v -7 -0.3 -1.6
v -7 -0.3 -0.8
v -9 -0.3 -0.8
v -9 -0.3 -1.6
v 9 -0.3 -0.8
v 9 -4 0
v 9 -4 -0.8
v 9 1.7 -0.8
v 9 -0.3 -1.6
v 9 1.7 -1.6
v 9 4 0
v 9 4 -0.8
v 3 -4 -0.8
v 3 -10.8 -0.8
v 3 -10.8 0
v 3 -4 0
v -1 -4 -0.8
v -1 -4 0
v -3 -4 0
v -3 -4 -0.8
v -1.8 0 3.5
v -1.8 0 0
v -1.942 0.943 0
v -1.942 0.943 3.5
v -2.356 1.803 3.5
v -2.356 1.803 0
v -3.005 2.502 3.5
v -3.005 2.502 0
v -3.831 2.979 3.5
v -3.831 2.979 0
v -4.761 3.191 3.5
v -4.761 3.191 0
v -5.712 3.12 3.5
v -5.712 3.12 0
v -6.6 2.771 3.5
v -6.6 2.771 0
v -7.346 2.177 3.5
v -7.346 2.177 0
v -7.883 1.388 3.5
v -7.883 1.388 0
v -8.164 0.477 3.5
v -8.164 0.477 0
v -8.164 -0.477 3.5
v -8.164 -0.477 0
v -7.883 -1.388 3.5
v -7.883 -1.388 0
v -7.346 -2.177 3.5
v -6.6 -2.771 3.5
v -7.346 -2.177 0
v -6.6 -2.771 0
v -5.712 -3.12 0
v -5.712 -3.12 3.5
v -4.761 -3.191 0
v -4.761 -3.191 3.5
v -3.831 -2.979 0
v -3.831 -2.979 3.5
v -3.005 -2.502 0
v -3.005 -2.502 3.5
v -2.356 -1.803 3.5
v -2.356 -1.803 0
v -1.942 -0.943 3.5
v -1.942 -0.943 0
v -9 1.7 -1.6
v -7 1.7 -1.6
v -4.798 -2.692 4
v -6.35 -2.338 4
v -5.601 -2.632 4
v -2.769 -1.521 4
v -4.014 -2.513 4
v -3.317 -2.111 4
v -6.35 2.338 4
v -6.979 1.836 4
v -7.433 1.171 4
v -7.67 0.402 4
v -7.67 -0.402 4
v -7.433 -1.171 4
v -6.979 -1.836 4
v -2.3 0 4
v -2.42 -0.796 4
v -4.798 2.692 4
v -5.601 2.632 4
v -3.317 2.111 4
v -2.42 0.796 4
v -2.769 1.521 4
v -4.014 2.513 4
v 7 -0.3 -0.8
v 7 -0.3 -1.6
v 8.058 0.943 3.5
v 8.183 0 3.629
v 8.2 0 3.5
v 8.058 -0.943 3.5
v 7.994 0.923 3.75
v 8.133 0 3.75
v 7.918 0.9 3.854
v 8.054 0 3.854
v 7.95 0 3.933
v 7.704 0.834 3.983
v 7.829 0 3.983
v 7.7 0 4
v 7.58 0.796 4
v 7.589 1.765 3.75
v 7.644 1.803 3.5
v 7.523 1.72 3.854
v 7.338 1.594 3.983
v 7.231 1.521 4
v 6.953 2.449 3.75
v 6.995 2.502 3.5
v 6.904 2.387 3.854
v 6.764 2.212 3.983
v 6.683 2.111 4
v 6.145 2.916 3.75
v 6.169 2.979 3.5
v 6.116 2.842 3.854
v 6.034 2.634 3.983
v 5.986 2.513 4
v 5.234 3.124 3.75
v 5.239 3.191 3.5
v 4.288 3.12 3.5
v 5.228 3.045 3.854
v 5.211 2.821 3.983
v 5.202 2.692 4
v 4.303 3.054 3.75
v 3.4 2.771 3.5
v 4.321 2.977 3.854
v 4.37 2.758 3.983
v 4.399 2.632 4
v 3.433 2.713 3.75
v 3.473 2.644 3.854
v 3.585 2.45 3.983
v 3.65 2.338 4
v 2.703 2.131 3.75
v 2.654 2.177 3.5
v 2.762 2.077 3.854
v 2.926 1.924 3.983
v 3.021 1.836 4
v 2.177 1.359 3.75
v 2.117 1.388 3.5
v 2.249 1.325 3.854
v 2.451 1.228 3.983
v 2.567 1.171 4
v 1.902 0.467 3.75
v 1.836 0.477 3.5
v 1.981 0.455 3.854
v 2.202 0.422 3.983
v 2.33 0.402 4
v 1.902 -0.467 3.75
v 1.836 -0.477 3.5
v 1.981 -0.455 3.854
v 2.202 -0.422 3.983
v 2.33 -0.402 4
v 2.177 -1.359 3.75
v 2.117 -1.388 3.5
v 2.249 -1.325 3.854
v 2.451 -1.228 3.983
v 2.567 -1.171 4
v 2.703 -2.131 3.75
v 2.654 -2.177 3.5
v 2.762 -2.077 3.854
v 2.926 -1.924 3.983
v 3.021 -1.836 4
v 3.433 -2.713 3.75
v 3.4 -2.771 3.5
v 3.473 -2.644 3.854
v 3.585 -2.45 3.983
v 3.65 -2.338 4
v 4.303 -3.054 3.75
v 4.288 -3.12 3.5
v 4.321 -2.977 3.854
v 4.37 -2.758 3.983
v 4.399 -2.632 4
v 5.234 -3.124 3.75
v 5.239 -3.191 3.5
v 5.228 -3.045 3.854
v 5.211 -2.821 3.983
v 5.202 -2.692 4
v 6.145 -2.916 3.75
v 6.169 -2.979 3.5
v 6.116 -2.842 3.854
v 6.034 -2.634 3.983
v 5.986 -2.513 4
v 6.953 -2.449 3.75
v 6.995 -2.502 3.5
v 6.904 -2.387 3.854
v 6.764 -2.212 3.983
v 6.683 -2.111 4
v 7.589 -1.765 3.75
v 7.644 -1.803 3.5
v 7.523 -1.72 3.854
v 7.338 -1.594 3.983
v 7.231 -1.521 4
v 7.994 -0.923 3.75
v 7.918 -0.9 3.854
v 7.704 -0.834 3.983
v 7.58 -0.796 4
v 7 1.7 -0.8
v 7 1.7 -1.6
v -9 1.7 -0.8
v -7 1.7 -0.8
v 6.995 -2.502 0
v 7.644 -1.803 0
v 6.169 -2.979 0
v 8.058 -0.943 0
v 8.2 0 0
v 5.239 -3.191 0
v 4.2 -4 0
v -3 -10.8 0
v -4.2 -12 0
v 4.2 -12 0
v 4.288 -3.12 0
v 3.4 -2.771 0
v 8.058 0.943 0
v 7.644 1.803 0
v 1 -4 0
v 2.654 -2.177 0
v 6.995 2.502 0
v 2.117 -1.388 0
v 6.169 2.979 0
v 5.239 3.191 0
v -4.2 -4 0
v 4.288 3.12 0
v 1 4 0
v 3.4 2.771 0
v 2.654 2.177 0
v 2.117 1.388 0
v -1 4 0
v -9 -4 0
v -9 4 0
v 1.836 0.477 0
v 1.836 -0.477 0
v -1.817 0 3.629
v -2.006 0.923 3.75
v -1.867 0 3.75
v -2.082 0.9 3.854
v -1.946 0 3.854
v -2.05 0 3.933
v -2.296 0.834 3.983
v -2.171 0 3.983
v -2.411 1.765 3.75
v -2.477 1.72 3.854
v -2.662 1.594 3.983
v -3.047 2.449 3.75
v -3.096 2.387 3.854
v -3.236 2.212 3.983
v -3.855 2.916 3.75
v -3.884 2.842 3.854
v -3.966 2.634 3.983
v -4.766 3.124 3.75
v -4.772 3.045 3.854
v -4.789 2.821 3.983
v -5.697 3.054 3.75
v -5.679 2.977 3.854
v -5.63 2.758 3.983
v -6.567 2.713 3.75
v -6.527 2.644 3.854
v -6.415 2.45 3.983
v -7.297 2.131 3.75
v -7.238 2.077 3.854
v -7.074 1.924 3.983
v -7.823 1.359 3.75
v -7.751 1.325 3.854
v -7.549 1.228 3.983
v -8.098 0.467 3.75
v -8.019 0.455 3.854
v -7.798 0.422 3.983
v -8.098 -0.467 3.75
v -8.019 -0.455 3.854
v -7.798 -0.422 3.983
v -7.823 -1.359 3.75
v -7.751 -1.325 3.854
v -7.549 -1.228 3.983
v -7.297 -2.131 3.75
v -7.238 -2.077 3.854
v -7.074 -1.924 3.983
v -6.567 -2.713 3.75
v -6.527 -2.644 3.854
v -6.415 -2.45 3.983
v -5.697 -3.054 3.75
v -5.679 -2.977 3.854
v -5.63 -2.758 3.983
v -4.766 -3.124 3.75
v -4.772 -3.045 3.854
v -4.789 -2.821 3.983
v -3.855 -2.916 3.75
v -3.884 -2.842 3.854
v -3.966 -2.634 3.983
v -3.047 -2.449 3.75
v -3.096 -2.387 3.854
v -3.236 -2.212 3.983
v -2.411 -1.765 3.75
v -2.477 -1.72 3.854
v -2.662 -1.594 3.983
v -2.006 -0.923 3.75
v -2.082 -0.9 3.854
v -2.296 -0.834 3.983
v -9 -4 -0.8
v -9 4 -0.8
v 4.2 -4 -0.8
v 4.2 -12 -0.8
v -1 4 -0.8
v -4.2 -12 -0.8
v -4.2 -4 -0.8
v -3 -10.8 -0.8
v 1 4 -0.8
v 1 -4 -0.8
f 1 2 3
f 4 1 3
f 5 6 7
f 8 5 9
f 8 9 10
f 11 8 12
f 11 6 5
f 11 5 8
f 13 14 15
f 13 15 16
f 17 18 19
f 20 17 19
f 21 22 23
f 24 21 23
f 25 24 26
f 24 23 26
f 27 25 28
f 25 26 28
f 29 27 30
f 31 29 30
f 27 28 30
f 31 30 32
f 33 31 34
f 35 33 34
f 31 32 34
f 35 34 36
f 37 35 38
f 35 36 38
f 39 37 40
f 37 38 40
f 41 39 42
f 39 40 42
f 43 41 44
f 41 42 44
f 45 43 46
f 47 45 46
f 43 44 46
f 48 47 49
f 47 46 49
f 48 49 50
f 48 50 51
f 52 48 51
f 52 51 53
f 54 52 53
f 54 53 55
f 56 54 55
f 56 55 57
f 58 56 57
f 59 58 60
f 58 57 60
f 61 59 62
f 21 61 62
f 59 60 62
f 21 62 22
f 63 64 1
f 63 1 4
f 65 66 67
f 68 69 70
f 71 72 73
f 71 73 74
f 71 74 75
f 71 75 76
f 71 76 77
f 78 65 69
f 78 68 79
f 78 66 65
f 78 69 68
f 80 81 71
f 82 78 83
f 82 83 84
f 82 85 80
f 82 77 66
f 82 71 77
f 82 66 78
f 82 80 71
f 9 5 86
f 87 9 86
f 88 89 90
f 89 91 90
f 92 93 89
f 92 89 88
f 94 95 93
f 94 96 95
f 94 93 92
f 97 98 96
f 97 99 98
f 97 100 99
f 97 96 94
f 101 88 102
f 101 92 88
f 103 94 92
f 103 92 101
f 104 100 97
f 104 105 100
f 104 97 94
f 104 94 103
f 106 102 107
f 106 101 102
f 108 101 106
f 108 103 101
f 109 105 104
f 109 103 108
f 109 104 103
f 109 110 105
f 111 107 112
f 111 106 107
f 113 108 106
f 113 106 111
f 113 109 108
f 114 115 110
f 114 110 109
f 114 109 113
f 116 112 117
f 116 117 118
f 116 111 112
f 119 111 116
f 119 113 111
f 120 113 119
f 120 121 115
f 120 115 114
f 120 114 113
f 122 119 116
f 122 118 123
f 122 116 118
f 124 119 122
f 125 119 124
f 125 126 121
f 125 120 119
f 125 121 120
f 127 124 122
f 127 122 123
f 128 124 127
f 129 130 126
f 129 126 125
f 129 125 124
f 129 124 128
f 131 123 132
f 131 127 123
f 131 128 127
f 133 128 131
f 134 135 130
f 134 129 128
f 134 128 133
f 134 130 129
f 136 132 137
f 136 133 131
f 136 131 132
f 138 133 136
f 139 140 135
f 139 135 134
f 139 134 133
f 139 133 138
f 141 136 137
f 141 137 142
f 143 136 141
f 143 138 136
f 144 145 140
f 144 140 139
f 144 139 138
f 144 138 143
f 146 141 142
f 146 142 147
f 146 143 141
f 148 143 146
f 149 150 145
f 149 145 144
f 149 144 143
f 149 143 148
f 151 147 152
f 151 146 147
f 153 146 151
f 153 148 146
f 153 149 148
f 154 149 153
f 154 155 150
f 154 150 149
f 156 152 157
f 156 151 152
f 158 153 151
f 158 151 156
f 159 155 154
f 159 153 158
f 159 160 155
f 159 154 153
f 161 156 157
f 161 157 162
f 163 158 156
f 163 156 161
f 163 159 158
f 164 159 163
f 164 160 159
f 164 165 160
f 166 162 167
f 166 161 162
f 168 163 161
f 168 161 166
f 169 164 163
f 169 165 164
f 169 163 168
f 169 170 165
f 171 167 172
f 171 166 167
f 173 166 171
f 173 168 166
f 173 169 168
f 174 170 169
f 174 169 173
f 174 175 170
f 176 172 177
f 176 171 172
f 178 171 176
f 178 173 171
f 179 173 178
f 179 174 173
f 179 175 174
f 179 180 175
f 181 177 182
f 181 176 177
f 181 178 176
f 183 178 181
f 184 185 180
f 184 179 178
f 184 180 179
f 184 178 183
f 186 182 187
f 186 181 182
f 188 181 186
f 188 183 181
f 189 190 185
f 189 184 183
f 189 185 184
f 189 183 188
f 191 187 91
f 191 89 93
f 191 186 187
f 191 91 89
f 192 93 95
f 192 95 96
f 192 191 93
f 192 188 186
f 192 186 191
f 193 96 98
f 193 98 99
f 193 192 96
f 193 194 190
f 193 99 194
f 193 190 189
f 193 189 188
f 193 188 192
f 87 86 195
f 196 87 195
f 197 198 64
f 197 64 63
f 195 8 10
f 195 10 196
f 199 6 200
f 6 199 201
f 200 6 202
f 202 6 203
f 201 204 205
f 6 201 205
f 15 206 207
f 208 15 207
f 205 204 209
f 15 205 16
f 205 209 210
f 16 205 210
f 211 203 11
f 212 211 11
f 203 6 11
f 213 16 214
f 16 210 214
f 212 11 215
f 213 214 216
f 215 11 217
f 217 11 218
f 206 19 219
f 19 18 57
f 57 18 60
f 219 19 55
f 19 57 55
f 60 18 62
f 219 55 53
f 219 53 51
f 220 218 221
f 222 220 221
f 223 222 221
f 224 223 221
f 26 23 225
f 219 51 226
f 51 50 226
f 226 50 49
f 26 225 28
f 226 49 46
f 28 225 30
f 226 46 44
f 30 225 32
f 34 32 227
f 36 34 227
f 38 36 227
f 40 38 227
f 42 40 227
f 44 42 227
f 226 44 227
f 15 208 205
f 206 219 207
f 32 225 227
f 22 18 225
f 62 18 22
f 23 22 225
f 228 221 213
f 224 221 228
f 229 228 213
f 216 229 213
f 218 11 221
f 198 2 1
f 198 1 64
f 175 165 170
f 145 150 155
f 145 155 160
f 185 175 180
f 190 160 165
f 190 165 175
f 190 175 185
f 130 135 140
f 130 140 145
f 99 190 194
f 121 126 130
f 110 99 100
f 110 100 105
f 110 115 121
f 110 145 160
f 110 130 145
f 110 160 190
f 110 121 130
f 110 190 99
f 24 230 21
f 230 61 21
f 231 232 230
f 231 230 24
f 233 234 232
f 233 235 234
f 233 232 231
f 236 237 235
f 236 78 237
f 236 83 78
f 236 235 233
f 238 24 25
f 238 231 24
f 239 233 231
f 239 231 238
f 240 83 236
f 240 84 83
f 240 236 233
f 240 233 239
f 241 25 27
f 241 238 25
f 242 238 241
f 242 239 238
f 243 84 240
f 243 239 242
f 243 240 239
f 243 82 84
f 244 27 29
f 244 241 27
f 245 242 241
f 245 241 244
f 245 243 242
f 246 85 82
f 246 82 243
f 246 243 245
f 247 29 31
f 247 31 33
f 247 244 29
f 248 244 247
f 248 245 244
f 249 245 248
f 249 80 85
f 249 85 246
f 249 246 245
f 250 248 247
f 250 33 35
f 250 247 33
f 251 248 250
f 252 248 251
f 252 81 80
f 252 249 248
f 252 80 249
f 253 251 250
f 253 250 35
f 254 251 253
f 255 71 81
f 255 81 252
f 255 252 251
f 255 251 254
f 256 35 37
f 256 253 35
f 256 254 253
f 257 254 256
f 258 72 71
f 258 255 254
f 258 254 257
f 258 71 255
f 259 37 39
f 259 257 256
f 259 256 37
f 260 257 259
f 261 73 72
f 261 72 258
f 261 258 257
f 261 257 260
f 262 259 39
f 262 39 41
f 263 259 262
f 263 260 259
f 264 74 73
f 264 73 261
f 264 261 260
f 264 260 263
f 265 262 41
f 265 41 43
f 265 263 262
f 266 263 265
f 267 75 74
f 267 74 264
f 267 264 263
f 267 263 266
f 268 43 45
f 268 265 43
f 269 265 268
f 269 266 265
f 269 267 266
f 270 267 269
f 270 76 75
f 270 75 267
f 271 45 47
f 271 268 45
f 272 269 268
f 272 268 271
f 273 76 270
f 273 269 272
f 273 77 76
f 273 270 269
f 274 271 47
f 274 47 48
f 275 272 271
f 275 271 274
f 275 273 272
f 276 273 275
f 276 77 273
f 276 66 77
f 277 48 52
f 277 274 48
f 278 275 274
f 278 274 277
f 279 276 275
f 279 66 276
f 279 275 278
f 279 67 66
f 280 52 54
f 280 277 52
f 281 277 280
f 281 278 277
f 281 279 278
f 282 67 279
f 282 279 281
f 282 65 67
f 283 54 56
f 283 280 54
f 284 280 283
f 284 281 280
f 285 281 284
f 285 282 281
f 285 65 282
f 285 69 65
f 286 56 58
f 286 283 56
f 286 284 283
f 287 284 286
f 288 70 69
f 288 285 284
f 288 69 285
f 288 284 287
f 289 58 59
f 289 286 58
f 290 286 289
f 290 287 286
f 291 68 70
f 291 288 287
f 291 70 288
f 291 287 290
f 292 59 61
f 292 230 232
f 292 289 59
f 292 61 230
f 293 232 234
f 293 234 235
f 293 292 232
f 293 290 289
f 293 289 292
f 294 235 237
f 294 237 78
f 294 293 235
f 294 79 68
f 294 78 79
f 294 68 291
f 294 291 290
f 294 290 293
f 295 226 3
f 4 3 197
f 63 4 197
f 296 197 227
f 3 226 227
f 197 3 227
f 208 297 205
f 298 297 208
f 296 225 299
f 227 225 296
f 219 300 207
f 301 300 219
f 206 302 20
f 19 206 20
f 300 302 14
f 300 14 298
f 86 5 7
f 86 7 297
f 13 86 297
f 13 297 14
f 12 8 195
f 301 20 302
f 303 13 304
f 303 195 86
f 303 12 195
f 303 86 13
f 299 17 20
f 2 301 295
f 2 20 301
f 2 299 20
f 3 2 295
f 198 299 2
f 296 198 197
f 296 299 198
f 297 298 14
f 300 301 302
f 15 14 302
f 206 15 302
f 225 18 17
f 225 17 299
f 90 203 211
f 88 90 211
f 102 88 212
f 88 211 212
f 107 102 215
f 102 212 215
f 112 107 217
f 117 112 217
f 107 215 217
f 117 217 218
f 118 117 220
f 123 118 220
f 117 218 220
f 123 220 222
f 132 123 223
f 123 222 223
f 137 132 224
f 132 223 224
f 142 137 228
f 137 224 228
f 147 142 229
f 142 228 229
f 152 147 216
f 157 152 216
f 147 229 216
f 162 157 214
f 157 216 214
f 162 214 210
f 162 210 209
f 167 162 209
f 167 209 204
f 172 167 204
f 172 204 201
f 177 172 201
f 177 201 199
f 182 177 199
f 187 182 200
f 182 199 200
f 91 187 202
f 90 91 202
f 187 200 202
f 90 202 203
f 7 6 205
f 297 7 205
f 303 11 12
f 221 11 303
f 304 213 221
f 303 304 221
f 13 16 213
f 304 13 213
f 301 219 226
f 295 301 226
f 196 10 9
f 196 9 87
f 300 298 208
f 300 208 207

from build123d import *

# Parameters (mm, degrees)
SKETCH_2_R        = 3.2
EXTRUDE_1_DEPTH   = 4
EXTRUDE_1_2_DEPTH = 4
SKETCH_3_W        = 8
SKETCH_3_H        = 8
EXTRUDE_2_DEPTH   = 0.8
SKETCH_4_W        = 2
SKETCH_4_H        = 2
EXTRUDE_3_DEPTH   = 0.8
SKETCH_5_W        = 6
SKETCH_5_H        = 1.2
SKETCH_5_W_2      = 1.2
SKETCH_5_H_2      = 8
EXTRUDE_4_DEPTH   = 0.8
FILLET_1_R        = 0.5


with BuildPart() as part:
    # Эскиз2 → Бобышка-Вытянуть1 (new body)
    with BuildSketch(Plane.XY):
        with Locations((-5, 0)):
            Circle(SKETCH_2_R)
    extrude(amount=EXTRUDE_1_DEPTH)



with BuildPart() as body_2:
    # Эскиз2 → Extrude 1 2 (new body)
    with BuildSketch(Plane.XY):
        with Locations((5, 0)):
            Circle(SKETCH_2_R)
    extrude(amount=EXTRUDE_1_2_DEPTH)


with BuildPart() as part_1:
    add(part.part)

    add(body_2.part)  # Бобышка-Вытянуть2 merges body 2
    # Эскиз3 → Бобышка-Вытянуть2 (add)
    with BuildSketch(Plane(origin=(0, 0, 0), x_dir=(-1, 0, 0), z_dir=(0, 0, -1))):
        with Locations((-5, 0)):
            Rectangle(SKETCH_3_W, SKETCH_3_H)
        with Locations((5, 0)):
            Rectangle(SKETCH_3_W, SKETCH_3_H)
    extrude(amount=EXTRUDE_2_DEPTH)

    # Эскиз4 → Бобышка-Вытянуть3 (add)
    with BuildSketch(Plane(origin=(0, 0, -0.8), x_dir=(-1, 0, 0), z_dir=(0, 0, -1))):
        with Locations((-8, 0.7)):
            Rectangle(SKETCH_4_W, SKETCH_4_H)
        with Locations((8, 0.7)):
            Rectangle(SKETCH_4_W, SKETCH_4_H)
    extrude(amount=EXTRUDE_3_DEPTH)

    # Эскиз5 → Бобышка-Вытянуть4 (add)
    with BuildSketch(Plane(origin=(0, 0, -0.8), x_dir=(-1, 0, 0), z_dir=(0, 0, -1))):
        Polygon((-3, -10.8), (-3, -4), (-4.2, -4), (-4.2, -12), (-3, -12), align=None)
        with Locations((0, -11.4)):
            Rectangle(SKETCH_5_W, SKETCH_5_H)
        with Locations((3.6, -8)):
            Rectangle(SKETCH_5_W_2, SKETCH_5_H_2)
    extrude(amount=-EXTRUDE_4_DEPTH)

    # Скругление1
    fillet_1_edges = [part_1.edges().sort_by_distance(p)[0] for p in [
        (-8.2, 0, 4),
        (1.8, 0, 4),
    ]]
    fillet(fillet_1_edges, radius=FILLET_1_R)


solid = part_1.part
